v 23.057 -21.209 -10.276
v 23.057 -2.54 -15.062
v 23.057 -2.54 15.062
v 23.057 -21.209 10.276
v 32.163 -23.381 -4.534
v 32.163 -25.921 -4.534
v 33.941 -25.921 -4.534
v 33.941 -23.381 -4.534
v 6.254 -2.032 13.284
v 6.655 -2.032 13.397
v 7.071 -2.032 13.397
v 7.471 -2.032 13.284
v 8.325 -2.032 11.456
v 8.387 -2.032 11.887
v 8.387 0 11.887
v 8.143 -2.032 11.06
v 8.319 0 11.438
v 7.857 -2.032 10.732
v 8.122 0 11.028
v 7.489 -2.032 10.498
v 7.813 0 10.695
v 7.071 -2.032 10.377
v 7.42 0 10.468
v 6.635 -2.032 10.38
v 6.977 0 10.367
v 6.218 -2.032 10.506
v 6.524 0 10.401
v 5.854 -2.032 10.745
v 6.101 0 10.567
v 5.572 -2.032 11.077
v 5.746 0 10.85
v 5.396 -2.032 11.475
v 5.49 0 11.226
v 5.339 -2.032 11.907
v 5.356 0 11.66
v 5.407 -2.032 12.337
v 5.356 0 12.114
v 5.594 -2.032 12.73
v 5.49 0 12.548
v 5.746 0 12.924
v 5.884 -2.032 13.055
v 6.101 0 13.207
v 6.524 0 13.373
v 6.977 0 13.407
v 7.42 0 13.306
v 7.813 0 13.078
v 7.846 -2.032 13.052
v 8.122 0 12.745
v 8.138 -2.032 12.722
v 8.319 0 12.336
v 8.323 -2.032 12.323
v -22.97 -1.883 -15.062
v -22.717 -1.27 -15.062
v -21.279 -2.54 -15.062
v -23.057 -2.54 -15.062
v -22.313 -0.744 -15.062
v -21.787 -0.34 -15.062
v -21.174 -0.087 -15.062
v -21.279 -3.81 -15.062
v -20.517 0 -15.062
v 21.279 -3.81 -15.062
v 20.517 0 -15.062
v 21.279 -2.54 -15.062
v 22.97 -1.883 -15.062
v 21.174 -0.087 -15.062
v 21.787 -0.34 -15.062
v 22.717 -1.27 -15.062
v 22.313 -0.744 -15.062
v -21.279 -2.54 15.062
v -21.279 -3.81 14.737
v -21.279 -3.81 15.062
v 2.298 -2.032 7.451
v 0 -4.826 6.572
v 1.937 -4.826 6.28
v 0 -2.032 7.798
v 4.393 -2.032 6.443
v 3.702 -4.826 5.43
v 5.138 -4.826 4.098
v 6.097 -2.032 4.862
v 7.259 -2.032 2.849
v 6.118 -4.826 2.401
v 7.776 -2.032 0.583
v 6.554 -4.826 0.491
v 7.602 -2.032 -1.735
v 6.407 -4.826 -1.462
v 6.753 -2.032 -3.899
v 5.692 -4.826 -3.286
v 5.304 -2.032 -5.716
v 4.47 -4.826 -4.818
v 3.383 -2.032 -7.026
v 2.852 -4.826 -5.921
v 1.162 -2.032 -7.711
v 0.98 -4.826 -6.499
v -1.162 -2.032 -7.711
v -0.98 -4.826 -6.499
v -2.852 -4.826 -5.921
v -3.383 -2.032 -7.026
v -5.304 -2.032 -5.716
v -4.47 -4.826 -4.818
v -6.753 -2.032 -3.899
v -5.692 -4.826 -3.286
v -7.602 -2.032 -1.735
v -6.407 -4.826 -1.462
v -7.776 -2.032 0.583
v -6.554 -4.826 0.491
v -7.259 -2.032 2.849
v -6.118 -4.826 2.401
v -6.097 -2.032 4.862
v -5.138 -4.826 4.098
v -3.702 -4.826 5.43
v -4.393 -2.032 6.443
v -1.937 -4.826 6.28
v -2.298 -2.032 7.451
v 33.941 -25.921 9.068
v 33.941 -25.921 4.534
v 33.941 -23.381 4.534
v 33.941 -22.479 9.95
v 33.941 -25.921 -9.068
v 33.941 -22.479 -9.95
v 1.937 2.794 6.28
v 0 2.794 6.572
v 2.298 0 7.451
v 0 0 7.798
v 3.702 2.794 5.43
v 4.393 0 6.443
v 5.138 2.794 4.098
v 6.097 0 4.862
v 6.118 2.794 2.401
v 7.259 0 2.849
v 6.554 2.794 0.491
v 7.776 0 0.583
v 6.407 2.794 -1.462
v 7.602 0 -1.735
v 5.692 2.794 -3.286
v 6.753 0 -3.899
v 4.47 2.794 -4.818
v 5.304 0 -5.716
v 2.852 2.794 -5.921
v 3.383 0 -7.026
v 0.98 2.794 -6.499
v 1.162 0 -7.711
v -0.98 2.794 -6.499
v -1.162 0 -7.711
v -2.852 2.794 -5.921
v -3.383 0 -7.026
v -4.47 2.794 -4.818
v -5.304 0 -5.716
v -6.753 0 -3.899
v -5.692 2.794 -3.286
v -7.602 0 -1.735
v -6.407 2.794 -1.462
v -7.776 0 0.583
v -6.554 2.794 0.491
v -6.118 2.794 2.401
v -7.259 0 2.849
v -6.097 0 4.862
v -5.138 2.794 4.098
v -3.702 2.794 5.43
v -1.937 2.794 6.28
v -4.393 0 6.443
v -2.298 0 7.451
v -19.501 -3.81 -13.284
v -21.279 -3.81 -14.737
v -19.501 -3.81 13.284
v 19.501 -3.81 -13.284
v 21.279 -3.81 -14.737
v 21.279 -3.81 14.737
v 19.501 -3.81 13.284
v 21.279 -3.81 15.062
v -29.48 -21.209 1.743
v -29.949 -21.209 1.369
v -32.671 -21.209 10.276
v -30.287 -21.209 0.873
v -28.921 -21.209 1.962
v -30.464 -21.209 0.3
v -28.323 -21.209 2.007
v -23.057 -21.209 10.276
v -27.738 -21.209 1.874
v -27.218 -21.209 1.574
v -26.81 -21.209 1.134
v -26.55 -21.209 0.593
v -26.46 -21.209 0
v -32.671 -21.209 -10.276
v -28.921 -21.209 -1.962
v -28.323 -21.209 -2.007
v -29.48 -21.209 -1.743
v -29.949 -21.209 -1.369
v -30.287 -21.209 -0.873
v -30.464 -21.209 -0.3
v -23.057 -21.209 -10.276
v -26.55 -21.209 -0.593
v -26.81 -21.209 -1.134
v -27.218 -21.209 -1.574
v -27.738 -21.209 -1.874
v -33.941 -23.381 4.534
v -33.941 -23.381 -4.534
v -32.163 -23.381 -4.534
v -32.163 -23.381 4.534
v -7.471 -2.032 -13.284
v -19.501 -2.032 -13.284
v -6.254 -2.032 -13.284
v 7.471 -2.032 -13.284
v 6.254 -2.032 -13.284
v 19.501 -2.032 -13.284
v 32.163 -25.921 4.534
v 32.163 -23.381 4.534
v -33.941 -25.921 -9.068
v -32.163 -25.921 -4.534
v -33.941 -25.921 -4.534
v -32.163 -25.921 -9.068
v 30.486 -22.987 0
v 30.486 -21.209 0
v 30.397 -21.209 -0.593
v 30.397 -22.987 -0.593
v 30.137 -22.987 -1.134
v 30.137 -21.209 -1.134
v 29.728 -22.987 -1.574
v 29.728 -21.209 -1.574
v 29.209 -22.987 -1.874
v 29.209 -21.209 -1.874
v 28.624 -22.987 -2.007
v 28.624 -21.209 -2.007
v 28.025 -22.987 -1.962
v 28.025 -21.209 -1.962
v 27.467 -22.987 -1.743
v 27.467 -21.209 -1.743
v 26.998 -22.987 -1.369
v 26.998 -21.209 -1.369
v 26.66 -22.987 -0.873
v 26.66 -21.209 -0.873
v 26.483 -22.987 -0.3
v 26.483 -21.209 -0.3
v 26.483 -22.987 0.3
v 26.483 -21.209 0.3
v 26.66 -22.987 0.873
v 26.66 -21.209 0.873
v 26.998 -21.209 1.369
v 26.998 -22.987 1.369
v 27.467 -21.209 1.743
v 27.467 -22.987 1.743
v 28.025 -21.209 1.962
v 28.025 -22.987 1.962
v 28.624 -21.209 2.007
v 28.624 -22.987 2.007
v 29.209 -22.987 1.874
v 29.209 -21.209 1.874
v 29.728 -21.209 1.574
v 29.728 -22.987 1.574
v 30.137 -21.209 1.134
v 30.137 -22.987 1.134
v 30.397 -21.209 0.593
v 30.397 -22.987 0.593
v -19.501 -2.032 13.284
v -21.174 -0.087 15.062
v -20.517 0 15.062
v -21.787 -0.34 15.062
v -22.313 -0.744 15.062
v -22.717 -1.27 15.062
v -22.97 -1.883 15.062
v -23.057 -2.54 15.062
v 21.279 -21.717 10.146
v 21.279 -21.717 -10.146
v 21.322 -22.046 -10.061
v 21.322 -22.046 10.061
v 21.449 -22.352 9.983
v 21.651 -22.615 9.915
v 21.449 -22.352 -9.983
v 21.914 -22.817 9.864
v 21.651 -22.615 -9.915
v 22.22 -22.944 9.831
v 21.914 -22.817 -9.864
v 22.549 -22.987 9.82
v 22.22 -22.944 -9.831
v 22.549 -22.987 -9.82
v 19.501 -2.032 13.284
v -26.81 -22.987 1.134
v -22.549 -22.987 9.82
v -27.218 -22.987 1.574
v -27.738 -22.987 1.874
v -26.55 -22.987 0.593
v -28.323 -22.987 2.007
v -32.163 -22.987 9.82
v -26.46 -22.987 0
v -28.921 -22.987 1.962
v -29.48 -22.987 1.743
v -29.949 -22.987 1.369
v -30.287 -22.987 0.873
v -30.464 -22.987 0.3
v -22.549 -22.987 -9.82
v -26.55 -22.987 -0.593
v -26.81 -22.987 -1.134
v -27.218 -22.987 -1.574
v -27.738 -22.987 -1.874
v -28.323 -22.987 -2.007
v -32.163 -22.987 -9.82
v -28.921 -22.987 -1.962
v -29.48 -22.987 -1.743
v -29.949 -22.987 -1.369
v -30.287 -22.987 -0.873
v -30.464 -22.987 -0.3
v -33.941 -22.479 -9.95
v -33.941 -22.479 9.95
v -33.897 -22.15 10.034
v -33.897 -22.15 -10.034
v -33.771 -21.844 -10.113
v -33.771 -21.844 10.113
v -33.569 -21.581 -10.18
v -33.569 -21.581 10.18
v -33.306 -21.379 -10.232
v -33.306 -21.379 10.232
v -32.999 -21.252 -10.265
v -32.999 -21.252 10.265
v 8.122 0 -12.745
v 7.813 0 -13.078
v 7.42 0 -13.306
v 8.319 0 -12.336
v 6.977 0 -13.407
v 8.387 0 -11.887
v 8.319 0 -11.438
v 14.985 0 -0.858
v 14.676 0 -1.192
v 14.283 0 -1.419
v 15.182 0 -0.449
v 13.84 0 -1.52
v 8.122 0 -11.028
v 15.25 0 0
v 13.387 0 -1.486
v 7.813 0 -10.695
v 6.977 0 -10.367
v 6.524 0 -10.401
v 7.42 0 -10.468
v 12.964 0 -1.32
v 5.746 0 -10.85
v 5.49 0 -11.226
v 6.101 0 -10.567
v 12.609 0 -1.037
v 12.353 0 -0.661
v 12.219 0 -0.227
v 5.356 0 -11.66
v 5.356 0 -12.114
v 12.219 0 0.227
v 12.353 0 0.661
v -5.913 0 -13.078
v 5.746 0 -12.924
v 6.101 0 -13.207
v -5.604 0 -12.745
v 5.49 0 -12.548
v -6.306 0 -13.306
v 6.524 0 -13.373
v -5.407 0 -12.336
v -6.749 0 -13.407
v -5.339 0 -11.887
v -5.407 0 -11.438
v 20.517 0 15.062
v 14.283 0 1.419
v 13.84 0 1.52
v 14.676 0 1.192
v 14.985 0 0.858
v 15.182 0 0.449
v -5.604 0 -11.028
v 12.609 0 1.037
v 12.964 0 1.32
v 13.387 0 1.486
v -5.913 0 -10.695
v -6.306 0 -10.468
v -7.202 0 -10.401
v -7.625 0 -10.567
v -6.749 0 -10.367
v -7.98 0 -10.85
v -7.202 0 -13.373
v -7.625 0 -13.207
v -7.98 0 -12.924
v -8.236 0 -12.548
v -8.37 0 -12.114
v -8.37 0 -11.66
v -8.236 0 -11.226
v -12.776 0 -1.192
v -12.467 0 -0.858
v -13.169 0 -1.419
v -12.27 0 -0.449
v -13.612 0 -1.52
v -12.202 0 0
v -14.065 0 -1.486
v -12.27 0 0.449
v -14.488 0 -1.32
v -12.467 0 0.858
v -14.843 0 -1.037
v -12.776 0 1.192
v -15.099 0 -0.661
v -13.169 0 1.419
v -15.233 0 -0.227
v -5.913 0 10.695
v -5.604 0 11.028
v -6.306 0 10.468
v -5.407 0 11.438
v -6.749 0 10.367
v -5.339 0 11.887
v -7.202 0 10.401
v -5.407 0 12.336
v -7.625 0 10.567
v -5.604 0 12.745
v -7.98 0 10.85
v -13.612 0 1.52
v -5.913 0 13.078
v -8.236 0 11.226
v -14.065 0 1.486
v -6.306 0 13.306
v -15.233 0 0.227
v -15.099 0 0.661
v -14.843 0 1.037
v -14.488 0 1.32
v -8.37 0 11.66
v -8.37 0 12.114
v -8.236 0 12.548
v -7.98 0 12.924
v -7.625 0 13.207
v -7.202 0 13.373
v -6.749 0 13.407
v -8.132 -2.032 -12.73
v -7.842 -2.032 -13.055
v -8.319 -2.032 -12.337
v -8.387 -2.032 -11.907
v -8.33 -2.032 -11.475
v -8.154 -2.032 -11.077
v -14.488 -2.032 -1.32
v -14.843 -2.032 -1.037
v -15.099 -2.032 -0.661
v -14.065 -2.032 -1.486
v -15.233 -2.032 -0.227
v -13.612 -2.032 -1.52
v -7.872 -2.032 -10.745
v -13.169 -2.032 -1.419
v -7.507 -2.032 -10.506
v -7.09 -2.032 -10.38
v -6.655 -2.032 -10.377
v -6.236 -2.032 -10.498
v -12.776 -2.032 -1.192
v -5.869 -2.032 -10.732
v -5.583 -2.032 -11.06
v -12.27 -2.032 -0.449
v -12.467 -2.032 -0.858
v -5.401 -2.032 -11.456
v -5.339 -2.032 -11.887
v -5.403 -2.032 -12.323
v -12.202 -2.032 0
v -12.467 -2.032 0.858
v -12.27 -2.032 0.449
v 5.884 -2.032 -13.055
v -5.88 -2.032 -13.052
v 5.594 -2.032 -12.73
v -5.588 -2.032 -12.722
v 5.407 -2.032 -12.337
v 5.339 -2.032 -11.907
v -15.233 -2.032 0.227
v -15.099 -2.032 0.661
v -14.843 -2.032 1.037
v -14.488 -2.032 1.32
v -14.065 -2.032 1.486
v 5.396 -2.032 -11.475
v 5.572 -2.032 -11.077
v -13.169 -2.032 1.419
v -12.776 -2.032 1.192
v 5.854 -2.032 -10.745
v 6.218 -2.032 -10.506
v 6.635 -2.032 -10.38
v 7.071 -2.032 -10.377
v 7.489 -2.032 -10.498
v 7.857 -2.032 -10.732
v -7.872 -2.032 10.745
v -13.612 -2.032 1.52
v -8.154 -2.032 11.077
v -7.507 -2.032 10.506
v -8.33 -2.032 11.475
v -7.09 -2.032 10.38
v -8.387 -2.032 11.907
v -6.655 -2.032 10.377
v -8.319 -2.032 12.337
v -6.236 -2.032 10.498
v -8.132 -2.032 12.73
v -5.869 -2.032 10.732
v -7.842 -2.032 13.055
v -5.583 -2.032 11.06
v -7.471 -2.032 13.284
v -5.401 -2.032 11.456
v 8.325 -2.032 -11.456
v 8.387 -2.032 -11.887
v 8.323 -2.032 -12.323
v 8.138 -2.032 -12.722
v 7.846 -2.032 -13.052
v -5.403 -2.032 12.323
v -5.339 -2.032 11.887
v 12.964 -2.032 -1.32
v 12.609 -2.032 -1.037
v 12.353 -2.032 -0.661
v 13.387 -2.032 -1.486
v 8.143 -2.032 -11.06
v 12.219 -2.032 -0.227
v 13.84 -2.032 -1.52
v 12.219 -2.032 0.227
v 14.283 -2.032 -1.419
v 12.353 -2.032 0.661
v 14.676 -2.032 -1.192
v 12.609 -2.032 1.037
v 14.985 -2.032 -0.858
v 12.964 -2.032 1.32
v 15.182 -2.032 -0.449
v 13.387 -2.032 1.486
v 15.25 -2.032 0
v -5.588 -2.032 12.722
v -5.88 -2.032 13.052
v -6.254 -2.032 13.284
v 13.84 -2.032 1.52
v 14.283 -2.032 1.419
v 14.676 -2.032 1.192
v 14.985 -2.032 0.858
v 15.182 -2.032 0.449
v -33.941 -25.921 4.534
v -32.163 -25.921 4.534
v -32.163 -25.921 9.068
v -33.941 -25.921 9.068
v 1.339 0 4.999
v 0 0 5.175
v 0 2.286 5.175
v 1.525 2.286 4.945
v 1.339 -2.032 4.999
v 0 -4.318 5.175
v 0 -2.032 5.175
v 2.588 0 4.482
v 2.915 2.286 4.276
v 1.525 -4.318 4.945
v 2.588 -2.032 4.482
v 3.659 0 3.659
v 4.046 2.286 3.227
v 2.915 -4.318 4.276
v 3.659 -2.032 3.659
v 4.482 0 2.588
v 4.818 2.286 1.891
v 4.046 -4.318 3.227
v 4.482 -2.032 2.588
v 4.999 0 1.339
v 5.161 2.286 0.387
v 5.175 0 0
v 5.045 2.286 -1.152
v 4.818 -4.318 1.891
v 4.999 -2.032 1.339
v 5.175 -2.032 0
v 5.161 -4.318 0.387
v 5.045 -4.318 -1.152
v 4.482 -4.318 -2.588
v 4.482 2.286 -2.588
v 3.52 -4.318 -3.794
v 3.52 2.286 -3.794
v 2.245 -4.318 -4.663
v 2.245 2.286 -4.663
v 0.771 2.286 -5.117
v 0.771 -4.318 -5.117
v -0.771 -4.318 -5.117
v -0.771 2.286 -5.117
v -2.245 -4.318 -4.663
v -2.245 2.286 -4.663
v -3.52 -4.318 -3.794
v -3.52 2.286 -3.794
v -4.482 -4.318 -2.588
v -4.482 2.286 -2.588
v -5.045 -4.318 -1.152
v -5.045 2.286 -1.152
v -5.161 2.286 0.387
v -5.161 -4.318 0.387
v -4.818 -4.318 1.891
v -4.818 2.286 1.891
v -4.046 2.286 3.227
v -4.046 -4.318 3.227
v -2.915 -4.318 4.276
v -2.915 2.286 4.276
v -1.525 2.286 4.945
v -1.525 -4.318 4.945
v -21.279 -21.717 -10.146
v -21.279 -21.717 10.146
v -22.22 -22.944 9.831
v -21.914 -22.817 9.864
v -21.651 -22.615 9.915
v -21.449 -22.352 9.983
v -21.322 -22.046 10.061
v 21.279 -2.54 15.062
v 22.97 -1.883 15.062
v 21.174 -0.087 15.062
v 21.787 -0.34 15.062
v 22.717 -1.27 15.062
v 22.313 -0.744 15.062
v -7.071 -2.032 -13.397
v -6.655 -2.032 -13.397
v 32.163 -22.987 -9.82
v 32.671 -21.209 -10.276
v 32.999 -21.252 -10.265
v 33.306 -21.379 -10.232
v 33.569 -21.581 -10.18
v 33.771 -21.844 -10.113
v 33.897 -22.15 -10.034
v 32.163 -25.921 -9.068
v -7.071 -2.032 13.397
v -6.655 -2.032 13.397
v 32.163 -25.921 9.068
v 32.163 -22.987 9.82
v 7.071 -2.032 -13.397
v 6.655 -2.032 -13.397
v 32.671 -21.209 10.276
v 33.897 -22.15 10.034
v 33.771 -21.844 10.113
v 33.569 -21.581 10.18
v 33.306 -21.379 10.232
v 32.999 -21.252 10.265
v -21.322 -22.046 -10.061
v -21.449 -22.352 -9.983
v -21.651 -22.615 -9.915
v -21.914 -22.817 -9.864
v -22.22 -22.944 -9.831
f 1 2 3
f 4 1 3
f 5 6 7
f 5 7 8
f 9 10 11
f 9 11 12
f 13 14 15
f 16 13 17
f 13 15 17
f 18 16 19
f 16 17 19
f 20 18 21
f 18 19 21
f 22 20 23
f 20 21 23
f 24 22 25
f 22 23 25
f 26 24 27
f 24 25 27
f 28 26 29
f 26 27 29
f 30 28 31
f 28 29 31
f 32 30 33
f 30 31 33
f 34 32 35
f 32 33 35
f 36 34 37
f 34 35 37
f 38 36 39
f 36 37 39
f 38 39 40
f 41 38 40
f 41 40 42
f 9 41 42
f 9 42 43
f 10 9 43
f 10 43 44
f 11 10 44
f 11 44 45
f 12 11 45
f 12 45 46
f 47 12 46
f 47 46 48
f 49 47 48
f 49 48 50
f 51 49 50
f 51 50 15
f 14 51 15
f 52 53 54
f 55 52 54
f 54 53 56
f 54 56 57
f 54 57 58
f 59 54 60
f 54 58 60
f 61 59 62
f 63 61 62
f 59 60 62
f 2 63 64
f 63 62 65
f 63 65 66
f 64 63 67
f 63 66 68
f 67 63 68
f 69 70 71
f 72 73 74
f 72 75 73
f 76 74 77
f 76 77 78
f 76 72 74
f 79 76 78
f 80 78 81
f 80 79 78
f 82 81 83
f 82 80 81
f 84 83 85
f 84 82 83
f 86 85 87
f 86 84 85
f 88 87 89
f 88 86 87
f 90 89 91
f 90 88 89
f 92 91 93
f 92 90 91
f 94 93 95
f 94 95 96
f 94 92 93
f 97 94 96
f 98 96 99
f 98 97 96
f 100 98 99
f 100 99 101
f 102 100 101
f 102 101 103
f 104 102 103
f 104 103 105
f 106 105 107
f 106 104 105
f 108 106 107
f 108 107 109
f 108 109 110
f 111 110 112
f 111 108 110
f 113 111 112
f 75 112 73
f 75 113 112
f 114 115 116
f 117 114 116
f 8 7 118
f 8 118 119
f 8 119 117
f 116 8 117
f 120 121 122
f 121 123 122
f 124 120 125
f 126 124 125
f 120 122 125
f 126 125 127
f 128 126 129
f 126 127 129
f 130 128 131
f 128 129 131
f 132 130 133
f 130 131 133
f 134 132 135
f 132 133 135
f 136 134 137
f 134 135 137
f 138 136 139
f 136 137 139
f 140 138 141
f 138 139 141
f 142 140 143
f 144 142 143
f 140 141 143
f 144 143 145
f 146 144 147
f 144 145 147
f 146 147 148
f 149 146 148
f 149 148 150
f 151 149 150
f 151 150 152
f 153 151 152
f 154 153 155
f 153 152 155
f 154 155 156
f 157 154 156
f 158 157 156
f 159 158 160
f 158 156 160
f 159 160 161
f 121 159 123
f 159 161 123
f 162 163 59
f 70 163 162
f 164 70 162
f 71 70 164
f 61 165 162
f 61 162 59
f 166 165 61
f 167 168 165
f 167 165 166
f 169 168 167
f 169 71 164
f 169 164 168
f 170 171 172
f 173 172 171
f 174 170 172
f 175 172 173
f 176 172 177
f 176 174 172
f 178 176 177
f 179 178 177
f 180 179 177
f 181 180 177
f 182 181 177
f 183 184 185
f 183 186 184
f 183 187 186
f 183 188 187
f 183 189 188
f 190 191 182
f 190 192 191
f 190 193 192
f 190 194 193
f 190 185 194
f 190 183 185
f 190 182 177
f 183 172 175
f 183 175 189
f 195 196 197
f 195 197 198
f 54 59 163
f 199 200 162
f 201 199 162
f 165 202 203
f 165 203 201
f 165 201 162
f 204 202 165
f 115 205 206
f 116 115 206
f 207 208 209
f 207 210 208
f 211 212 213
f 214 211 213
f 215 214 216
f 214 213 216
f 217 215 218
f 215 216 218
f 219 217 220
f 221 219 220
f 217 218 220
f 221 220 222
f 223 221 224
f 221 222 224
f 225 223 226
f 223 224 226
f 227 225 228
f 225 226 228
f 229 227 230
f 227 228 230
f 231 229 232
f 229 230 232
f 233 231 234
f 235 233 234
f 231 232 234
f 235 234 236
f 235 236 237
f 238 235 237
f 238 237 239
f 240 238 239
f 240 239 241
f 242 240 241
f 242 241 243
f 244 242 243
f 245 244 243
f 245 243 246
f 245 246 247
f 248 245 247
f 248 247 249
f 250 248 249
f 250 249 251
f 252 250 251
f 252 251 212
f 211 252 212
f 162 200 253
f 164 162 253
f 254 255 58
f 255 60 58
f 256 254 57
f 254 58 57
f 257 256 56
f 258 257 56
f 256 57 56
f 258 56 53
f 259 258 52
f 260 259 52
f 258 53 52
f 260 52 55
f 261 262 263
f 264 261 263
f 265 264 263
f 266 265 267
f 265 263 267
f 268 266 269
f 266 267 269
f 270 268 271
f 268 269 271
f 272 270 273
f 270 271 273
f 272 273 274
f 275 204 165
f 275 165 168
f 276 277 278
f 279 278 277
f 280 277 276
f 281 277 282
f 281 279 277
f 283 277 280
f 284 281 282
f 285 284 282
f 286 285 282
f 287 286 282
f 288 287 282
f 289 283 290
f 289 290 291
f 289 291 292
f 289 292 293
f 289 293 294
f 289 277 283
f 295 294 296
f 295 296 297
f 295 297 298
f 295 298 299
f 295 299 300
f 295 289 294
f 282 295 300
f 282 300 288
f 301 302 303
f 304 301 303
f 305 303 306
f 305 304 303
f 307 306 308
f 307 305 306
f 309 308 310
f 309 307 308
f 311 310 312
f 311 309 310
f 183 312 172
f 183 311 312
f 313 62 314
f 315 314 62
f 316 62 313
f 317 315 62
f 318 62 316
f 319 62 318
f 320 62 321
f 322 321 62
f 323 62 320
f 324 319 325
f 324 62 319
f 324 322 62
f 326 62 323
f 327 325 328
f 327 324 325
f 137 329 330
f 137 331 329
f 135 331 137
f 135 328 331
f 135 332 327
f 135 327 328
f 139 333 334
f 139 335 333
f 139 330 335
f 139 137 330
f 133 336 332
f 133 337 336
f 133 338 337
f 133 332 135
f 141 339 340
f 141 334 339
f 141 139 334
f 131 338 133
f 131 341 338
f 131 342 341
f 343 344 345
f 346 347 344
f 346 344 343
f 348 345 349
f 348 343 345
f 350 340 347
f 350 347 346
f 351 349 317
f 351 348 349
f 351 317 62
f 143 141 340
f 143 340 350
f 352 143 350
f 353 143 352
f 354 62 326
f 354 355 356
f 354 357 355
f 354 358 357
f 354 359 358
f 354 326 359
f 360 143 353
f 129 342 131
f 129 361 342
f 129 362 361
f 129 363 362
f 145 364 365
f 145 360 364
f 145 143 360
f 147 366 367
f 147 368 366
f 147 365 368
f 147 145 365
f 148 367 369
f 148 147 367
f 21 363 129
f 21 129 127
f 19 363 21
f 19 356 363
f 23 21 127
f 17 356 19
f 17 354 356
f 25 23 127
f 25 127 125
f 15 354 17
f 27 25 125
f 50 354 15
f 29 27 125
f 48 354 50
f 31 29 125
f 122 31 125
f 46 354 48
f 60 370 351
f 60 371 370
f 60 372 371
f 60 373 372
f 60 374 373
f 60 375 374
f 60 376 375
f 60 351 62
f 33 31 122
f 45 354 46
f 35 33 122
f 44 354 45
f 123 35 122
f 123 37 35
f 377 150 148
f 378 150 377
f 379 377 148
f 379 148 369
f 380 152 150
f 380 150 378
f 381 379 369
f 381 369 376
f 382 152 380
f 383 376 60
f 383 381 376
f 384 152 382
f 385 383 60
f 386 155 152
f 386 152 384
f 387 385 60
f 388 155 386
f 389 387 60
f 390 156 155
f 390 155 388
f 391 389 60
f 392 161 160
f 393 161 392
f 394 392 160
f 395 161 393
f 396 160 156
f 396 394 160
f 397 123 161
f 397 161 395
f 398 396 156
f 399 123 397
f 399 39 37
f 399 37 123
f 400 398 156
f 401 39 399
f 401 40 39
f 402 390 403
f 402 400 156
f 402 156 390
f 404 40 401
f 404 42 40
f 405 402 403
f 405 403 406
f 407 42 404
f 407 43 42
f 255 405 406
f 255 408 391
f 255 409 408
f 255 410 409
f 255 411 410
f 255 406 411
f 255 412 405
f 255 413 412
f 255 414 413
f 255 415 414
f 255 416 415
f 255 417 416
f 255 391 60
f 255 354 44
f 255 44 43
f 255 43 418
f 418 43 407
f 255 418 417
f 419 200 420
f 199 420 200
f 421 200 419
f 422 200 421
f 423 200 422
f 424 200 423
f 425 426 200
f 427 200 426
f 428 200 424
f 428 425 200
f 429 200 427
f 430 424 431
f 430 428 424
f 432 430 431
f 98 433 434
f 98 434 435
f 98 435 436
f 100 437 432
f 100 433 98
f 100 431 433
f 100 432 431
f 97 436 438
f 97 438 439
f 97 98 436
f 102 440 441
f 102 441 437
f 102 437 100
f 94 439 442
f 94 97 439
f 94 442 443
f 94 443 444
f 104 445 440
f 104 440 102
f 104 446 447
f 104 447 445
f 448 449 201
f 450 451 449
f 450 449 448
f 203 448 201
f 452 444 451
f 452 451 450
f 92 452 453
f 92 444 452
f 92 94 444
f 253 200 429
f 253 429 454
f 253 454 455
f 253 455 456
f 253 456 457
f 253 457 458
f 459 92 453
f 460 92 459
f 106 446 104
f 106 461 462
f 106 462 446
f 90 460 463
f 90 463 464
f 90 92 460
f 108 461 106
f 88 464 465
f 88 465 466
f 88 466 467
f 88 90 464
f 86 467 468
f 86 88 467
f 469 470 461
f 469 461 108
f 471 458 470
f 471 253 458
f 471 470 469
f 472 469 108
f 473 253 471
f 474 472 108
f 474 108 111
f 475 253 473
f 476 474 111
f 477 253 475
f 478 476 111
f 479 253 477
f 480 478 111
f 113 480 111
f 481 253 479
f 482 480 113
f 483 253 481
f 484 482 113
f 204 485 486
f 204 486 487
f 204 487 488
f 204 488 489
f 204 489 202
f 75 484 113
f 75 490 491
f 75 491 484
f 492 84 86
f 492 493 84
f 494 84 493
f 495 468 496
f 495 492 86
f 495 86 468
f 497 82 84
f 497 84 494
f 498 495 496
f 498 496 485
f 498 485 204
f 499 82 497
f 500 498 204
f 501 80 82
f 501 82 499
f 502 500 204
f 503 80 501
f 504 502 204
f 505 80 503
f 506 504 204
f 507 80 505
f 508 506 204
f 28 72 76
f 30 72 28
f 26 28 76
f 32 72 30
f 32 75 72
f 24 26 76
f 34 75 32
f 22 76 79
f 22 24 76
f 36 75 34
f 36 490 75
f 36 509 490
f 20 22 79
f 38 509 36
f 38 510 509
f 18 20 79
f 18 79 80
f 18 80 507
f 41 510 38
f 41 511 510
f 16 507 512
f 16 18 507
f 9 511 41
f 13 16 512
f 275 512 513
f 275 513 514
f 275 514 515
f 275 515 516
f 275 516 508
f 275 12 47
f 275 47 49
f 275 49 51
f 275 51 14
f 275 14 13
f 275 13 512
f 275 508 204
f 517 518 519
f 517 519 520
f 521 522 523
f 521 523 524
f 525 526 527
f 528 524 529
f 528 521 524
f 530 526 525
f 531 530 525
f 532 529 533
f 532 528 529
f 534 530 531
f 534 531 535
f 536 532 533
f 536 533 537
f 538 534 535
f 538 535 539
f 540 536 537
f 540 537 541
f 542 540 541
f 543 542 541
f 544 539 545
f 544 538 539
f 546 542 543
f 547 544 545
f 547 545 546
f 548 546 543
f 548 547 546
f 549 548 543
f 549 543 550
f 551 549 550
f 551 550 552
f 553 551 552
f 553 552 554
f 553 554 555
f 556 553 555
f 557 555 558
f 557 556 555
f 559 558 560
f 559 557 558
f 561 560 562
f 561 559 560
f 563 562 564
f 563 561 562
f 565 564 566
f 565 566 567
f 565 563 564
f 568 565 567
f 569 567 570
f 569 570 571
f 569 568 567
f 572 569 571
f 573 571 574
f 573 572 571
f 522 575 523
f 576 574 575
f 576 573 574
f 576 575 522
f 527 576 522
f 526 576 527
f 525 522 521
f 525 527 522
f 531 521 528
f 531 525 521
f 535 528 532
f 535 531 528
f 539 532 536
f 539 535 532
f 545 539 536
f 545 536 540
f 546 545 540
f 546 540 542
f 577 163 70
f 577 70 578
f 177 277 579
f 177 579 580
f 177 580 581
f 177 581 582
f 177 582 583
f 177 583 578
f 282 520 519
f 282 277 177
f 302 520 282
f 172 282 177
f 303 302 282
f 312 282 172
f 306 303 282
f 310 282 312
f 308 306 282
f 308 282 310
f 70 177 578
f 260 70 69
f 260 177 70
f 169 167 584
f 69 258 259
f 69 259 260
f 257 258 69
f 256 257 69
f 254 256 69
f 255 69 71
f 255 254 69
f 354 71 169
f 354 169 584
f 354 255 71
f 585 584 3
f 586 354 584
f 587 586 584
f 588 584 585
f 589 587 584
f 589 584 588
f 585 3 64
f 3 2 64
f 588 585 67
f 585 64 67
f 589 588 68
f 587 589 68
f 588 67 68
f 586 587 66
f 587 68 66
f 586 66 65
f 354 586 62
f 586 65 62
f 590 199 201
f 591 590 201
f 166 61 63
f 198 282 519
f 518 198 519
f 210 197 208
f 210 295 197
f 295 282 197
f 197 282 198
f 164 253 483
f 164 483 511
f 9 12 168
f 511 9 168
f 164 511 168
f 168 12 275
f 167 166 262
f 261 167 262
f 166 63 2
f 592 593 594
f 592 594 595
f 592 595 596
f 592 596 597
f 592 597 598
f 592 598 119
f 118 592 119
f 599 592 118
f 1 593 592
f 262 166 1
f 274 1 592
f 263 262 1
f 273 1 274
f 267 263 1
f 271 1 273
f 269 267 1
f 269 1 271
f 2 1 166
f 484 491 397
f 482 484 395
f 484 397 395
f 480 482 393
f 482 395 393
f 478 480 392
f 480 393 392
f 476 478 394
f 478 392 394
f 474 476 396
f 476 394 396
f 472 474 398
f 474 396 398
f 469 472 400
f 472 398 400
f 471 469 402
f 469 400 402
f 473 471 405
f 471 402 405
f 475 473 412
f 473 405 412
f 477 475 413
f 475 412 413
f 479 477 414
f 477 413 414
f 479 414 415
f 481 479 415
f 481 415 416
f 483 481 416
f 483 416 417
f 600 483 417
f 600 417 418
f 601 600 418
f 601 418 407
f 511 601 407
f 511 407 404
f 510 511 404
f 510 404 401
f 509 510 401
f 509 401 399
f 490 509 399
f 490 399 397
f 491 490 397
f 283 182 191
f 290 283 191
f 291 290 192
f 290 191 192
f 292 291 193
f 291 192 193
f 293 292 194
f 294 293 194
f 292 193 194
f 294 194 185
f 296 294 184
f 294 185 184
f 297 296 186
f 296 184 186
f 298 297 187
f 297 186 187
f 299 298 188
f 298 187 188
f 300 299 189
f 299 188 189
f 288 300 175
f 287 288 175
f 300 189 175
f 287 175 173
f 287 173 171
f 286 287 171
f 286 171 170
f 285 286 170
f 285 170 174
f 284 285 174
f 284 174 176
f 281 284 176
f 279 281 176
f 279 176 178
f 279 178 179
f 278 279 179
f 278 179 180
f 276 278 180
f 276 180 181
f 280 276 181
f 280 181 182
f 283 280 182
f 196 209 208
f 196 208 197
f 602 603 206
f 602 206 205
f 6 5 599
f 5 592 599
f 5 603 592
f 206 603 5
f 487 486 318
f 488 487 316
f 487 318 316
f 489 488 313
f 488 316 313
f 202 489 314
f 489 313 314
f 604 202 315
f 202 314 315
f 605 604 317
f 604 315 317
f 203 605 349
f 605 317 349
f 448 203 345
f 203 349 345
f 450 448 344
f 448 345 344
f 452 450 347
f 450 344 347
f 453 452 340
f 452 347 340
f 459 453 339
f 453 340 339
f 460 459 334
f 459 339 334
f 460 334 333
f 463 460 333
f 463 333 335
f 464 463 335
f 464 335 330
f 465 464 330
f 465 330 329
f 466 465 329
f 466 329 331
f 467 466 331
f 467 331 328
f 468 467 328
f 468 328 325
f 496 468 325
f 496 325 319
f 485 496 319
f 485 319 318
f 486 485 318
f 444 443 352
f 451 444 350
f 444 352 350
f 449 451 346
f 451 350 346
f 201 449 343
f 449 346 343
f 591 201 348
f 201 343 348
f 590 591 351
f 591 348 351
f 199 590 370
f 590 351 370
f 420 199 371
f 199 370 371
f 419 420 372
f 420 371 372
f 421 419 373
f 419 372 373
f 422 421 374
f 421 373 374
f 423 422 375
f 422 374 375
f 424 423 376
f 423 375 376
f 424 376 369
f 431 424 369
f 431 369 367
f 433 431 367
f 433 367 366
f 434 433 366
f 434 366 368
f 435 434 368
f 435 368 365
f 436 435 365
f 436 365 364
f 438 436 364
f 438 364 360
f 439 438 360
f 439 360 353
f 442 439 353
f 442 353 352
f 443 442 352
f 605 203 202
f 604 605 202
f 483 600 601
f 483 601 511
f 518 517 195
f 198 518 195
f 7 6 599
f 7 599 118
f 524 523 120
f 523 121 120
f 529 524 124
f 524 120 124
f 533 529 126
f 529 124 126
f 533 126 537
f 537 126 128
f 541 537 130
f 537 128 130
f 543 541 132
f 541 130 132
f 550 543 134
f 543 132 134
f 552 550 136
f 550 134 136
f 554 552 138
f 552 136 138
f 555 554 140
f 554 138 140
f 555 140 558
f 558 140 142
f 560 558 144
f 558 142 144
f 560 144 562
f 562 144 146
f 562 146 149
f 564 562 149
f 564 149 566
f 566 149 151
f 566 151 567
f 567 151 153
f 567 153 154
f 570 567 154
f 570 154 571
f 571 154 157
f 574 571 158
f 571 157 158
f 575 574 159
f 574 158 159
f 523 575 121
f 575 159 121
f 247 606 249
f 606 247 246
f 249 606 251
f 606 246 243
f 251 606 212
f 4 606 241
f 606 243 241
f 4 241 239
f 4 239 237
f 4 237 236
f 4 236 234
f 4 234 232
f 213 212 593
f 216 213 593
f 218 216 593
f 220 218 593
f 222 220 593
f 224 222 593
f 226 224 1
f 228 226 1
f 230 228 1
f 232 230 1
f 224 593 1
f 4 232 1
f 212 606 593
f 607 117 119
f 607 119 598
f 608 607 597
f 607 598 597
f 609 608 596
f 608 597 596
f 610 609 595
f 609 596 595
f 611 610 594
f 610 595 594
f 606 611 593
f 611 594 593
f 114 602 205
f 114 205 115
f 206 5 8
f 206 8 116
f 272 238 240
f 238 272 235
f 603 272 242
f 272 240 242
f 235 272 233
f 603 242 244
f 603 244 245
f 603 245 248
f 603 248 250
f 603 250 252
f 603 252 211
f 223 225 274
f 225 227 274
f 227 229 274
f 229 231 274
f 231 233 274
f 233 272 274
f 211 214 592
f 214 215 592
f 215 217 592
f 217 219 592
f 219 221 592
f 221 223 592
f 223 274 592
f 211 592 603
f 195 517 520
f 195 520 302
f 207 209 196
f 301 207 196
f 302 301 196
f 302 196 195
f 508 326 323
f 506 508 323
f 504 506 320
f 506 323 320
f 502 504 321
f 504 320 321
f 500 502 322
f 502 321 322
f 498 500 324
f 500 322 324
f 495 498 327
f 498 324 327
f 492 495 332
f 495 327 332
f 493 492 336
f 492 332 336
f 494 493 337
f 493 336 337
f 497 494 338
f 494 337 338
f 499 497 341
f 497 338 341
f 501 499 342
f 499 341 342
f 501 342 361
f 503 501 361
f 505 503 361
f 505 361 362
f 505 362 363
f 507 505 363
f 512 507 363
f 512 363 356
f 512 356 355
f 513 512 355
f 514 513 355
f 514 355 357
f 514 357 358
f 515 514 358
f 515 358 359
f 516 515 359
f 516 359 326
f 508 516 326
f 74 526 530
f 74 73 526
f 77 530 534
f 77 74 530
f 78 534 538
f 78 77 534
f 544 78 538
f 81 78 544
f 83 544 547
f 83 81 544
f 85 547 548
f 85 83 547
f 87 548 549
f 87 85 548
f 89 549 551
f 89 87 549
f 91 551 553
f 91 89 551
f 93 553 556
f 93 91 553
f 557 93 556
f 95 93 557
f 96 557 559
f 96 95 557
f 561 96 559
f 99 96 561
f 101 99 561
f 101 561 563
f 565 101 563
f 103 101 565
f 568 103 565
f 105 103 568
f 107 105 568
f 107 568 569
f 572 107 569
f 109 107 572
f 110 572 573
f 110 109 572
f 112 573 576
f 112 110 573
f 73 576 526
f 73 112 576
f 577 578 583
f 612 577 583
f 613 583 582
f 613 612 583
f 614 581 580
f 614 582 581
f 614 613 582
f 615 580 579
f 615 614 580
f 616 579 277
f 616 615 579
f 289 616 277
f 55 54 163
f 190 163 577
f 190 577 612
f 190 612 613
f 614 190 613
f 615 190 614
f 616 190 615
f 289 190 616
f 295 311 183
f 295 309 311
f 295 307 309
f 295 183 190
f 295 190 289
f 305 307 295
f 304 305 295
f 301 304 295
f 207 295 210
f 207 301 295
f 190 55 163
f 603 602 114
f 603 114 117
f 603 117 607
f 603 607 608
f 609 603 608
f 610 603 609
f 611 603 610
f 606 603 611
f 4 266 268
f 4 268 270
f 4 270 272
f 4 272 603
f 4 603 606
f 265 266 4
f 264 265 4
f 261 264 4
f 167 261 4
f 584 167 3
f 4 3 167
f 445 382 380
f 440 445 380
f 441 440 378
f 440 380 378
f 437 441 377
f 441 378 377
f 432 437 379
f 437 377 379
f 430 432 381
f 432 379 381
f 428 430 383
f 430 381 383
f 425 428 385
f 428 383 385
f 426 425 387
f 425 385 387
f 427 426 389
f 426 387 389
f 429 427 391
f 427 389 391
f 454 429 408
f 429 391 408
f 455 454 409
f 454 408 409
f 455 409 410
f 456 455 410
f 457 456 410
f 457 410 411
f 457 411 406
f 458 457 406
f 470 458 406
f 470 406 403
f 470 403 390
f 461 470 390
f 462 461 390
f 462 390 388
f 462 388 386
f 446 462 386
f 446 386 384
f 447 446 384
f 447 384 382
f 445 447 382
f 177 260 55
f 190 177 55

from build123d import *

# Parameters (mm, degrees)
SKETCH1_R                       = 7.7978
SKETCH1_R_2                     = 6.57225
SKETCH1_R_3                     = 5.17525
BOSS_EXTRUDE1_DEPTH             = 2.032
BOSS_EXTRUDE2_REACH             = 17.062
BOSS_EXTRUDE2_DIRECTION_2_REACH = 17.062
SKETCH4_W                       = 3.302
SKETCH4_H                       = 2.032
BOSS_EXTRUDE3_DEPTH             = 30.1244
FILLET1_R                       = 2.54
FILLET2_R                       = 2.54
SKETCH5_W                       = 9.0678
SKETCH5_H                       = 2.54
CUT_EXTRUDE1_DEPTH              = 116.84
SKETCH6_R                       = 2.01295
CUT_EXTRUDE2_DEPTH              = 5.7117
SKETCH7_R                       = 1.524
CUT_EXTRUDE3_DEPTH              = 26.9207
CUT_EXTRUDE4_DEPTH              = 116.84
CUT_EXTRUDE4_DEPTH_BACK         = 116.84
SKETCH9_W                       = 42.5577
SKETCH9_H                       = 30.1244
SKETCH9_W_2                     = 39.0017
SKETCH9_H_2                     = 26.5684
BOSS_EXTRUDE4_DEPTH             = 1.778


with BuildPart() as part:
    # Sketch1 → Boss-Extrude1 (new body)
    with BuildSketch(Plane(origin=(0, 0, 0), x_dir=(1, 0, 0), z_dir=(0, 1, 0))):
        with BuildLine():
            ThreePointArc((-23.05685, 9.9822), (-21.568952448, 13.574302448), (-17.97685, 15.0622))
            Line((-17.97685, 15.0622), (17.97685, 15.0622))
            ThreePointArc((17.97685, 15.0622), (21.568952448, 13.574302448), (23.05685, 9.9822))
            Line((23.05685, 9.9822), (23.05685, -9.9822))
            ThreePointArc((23.05685, -9.9822), (21.568952448, -13.574302448), (17.97685, -15.0622))
            Line((17.97685, -15.0622), (-17.97685, -15.0622))
            ThreePointArc((-17.97685, -15.0622), (-21.568952448, -13.574302448), (-23.05685, -9.9822))
            Line((-23.05685, -9.9822), (-23.05685, 9.9822))
        make_face()
        Circle(SKETCH1_R, mode=Mode.SUBTRACT)
        Circle(SKETCH1_R)
        Circle(SKETCH1_R_2, mode=Mode.SUBTRACT)
        Circle(SKETCH1_R_2)
        Circle(SKETCH1_R_3, mode=Mode.SUBTRACT)
    extrude(amount=-BOSS_EXTRUDE1_DEPTH)

    # Sketch2 → Revolve1 (revolve)
    with BuildSketch(Plane(origin=(0, 0, 0), x_dir=(0, 0, -1), z_dir=(1, 0, 0))):
        Polygon((-5.17525, 2.286), (-6.57225, 2.794), (-7.7978, 0), (-5.17525, 0), align=None)
    revolve1 = revolve(axis=Axis((0, 0, 0), (0, 1, 0)))

    # Boss-Extrude2: up to this face of the body (flat: up to its plane)
    boss_extrude2_end = Plane(part.part.faces().sort_by_distance((0, -1.016, 15.0622))[0])
    # Sketch3 → Boss-Extrude2 (add, up to the picked face)
    with BuildSketch(Plane.XY, mode=Mode.PRIVATE) as boss_extrude2_sk1:
        with BuildLine():
            ThreePointArc((-23.05685, -1.27), (-22.684875612, -0.371974388), (-21.78685, 0))
            Line((-21.78685, 0), (-21.27885, 0))
            Line((-21.27885, 0), (-21.27885, -21.717))
            ThreePointArc((-21.27885, -21.717), (-21.650824388, -22.615025612), (-22.54885, -22.987))
            Line((-22.54885, -22.987), (-23.05685, -22.987))
            Line((-23.05685, -22.987), (-32.16275, -22.987))
            Line((-32.16275, -22.987), (-32.16275, -25.9207))
            Line((-32.16275, -25.9207), (-33.94075, -25.9207))
            Line((-33.94075, -25.9207), (-33.94075, -22.479))
            ThreePointArc((-33.94075, -22.479), (-33.568775612, -21.580974388), (-32.67075, -21.209))
            Line((-32.67075, -21.209), (-32.16275, -21.209))
            Line((-32.16275, -21.209), (-23.05685, -21.209))
            Line((-23.05685, -21.209), (-23.05685, -1.27))
        make_face()
    boss_extrude2_tool1 = split(extrude(boss_extrude2_sk1.sketch, amount=BOSS_EXTRUDE2_REACH, mode=Mode.PRIVATE), bisect_by=boss_extrude2_end, keep=Keep.BOTH, mode=Mode.PRIVATE)
    add(boss_extrude2_tool1.solids().sort_by_distance((-32.41675, -21.49748, 0))[0])
    # Sketch3 → Boss-Extrude2 (add, up to the picked face)
    with BuildSketch(Plane.XY, mode=Mode.PRIVATE) as boss_extrude2_sk2:
        with BuildLine():
            Line((21.27885, 0), (21.27885, -21.717))
            ThreePointArc((21.27885, -21.717), (21.650824388, -22.615025612), (22.54885, -22.987))
            Line((22.54885, -22.987), (23.05685, -22.987))
            Line((23.05685, -22.987), (32.16275, -22.987))
            Line((32.16275, -22.987), (32.16275, -25.9207))
            Line((32.16275, -25.9207), (33.94075, -25.9207))
            Line((33.94075, -25.9207), (33.94075, -22.479))
            ThreePointArc((33.94075, -22.479), (33.568775612, -21.580974388), (32.67075, -21.209))
            Line((32.67075, -21.209), (32.16275, -21.209))
            Line((32.16275, -21.209), (23.05685, -21.209))
            Line((23.05685, -21.209), (23.05685, -1.27))
            ThreePointArc((23.05685, -1.27), (22.684875612, -0.371974388), (21.78685, 0))
            Line((21.78685, 0), (21.27885, 0))
        make_face()
    boss_extrude2_tool2 = split(extrude(boss_extrude2_sk2.sketch, amount=BOSS_EXTRUDE2_REACH, mode=Mode.PRIVATE), bisect_by=boss_extrude2_end, keep=Keep.BOTH, mode=Mode.PRIVATE)
    add(boss_extrude2_tool2.solids().sort_by_distance((32.41675, -21.49748, 0))[0])

    # Boss-Extrude2 direction 2: up to this face of the body (flat: up to its plane)
    boss_extrude2_direction_2_end = Plane(part.part.faces().sort_by_distance((0, -1.016, -15.0622))[0])
    # Sketch3 → Boss-Extrude2 direction 2 (add, up to the picked face)
    with BuildSketch(Plane.XY, mode=Mode.PRIVATE) as boss_extrude2_direction_2_sk1:
        with BuildLine():
            ThreePointArc((-23.05685, -1.27), (-22.684875612, -0.371974388), (-21.78685, 0))
            Line((-21.78685, 0), (-21.27885, 0))
            Line((-21.27885, 0), (-21.27885, -21.717))
            ThreePointArc((-21.27885, -21.717), (-21.650824388, -22.615025612), (-22.54885, -22.987))
            Line((-22.54885, -22.987), (-23.05685, -22.987))
            Line((-23.05685, -22.987), (-32.16275, -22.987))
            Line((-32.16275, -22.987), (-32.16275, -25.9207))
            Line((-32.16275, -25.9207), (-33.94075, -25.9207))
            Line((-33.94075, -25.9207), (-33.94075, -22.479))
            ThreePointArc((-33.94075, -22.479), (-33.568775612, -21.580974388), (-32.67075, -21.209))
            Line((-32.67075, -21.209), (-32.16275, -21.209))
            Line((-32.16275, -21.209), (-23.05685, -21.209))
            Line((-23.05685, -21.209), (-23.05685, -1.27))
        make_face()
    boss_extrude2_direction_2_tool1 = split(extrude(boss_extrude2_direction_2_sk1.sketch, amount=-BOSS_EXTRUDE2_DIRECTION_2_REACH, mode=Mode.PRIVATE), bisect_by=boss_extrude2_direction_2_end, keep=Keep.BOTH, mode=Mode.PRIVATE)
    add(boss_extrude2_direction_2_tool1.solids().sort_by_distance((-32.41675, -21.49748, 0))[0])
    # Sketch3 → Boss-Extrude2 direction 2 (add, up to the picked face)
    with BuildSketch(Plane.XY, mode=Mode.PRIVATE) as boss_extrude2_direction_2_sk2:
        with BuildLine():
            Line((21.27885, 0), (21.27885, -21.717))
            ThreePointArc((21.27885, -21.717), (21.650824388, -22.615025612), (22.54885, -22.987))
            Line((22.54885, -22.987), (23.05685, -22.987))
            Line((23.05685, -22.987), (32.16275, -22.987))
            Line((32.16275, -22.987), (32.16275, -25.9207))
            Line((32.16275, -25.9207), (33.94075, -25.9207))
            Line((33.94075, -25.9207), (33.94075, -22.479))
            ThreePointArc((33.94075, -22.479), (33.568775612, -21.580974388), (32.67075, -21.209))
            Line((32.67075, -21.209), (32.16275, -21.209))
            Line((32.16275, -21.209), (23.05685, -21.209))
            Line((23.05685, -21.209), (23.05685, -1.27))
            ThreePointArc((23.05685, -1.27), (22.684875612, -0.371974388), (21.78685, 0))
            Line((21.78685, 0), (21.27885, 0))
        make_face()
    boss_extrude2_direction_2_tool2 = split(extrude(boss_extrude2_direction_2_sk2.sketch, amount=-BOSS_EXTRUDE2_DIRECTION_2_REACH, mode=Mode.PRIVATE), bisect_by=boss_extrude2_direction_2_end, keep=Keep.BOTH, mode=Mode.PRIVATE)
    add(boss_extrude2_direction_2_tool2.solids().sort_by_distance((32.41675, -21.49748, 0))[0])

    # Sketch4 → Boss-Extrude3 (add)
    with BuildSketch(Plane.XY.offset(15.0622)):
        with BuildLine():
            ThreePointArc((-23.05685, -1.27), (-22.684875612, -0.371974388), (-21.78685, 0))
            Line((-21.78685, 0), (-23.05685, 0))
            Line((-23.05685, 0), (-23.05685, -1.27))
        make_face()
        with BuildLine():
            Line((-21.27885, -2.032), (-21.27885, 0))
            Line((-21.27885, 0), (-21.78685, 0))
            ThreePointArc((-21.78685, 0), (-22.684875612, -0.371974388), (-23.05685, -1.27))
            Line((-23.05685, -1.27), (-23.05685, -2.032))
            Line((-23.05685, -2.032), (-21.27885, -2.032))
        make_face()
        with Locations((-19.62785, -1.016)):
            Rectangle(SKETCH4_W, SKETCH4_H)
        Polygon((23.05685, 0), (21.27885, 0), (17.97685, 0), (17.97685, -2.032), (21.27885, -2.032), (23.05685, -2.032), align=None)
    extrude(amount=-BOSS_EXTRUDE3_DEPTH)

    # Fillet1
    fillet1_edges = [part.edges().sort_by_distance(p)[0] for p in [
        (23.05685, 0, 0),
    ]]
    fillet(fillet1_edges, radius=FILLET1_R)

    # Fillet2
    fillet2_edges = [part.edges().sort_by_distance(p)[0] for p in [
        (-23.05685, 0, 0),
    ]]
    fillet(fillet2_edges, radius=FILLET2_R)

    # Sketch5 → Cut-Extrude1 (cut)
    with BuildSketch(Plane.ZY.offset(33.94075)):
        with Locations((0, -24.6507)):
            Rectangle(SKETCH5_W, SKETCH5_H)
    extrude(amount=-CUT_EXTRUDE1_DEPTH, mode=Mode.SUBTRACT)

    # Sketch6 → Cut-Extrude2 (cut, through all)
    with BuildSketch(Plane(origin=(0, -21.209, 0), x_dir=(1, 0, 0), z_dir=(0, 1, 0))):
        with Locations((-28.4734, 0)):
            Circle(SKETCH6_R)
        with Locations((28.4734, 0)):
            Circle(SKETCH6_R)
    extrude(amount=-CUT_EXTRUDE2_DEPTH, mode=Mode.SUBTRACT)

    # Sketch7 → Cut-Extrude3 (cut, through all)
    with BuildSketch(Plane(origin=(0, 0, 0), x_dir=(1, 0, 0), z_dir=(0, 1, 0))):
        with Locations((13.725830849, 0)):
            Circle(SKETCH7_R)
        with Locations((-13.725830849, 0)):
            Circle(SKETCH7_R)
        with Locations((-6.862915424, -11.886918203)):
            Circle(SKETCH7_R)
        with Locations((6.862915424, 11.886918203)):
            Circle(SKETCH7_R)
        with Locations((-6.862915424, 11.886918203)):
            Circle(SKETCH7_R)
        with Locations((6.862915424, -11.886918203)):
            Circle(SKETCH7_R)
    extrude(amount=-CUT_EXTRUDE3_DEPTH, mode=Mode.SUBTRACT)

    # Sketch8 → Cut-Extrude4 (cut, two sides)
    with BuildSketch(Plane.ZY.offset(23.05685)) as cut_extrude4_sk:
        Polygon((-15.0622, -2.54), (-9.0678, -25.9207), (-15.0622, -25.9207), align=None)
        Polygon((9.0678, -25.9207), (15.0622, -2.54), (15.0622, -25.9207), align=None)
    extrude(amount=CUT_EXTRUDE4_DEPTH, mode=Mode.SUBTRACT)
    extrude(cut_extrude4_sk.sketch, amount=-CUT_EXTRUDE4_DEPTH_BACK, mode=Mode.SUBTRACT)

    # Mirror4: Revolve1 across plane
    add(revolve1.mirror(Plane.ZX.offset(-1.016)))

    # Sketch9 → Boss-Extrude4 (add)
    with BuildSketch(Plane.XZ.offset(2.032)):
        Rectangle(SKETCH9_W, SKETCH9_H)
        Rectangle(SKETCH9_W_2, SKETCH9_H_2, mode=Mode.SUBTRACT)
    extrude(amount=BOSS_EXTRUDE4_DEPTH)


solid = part.part
